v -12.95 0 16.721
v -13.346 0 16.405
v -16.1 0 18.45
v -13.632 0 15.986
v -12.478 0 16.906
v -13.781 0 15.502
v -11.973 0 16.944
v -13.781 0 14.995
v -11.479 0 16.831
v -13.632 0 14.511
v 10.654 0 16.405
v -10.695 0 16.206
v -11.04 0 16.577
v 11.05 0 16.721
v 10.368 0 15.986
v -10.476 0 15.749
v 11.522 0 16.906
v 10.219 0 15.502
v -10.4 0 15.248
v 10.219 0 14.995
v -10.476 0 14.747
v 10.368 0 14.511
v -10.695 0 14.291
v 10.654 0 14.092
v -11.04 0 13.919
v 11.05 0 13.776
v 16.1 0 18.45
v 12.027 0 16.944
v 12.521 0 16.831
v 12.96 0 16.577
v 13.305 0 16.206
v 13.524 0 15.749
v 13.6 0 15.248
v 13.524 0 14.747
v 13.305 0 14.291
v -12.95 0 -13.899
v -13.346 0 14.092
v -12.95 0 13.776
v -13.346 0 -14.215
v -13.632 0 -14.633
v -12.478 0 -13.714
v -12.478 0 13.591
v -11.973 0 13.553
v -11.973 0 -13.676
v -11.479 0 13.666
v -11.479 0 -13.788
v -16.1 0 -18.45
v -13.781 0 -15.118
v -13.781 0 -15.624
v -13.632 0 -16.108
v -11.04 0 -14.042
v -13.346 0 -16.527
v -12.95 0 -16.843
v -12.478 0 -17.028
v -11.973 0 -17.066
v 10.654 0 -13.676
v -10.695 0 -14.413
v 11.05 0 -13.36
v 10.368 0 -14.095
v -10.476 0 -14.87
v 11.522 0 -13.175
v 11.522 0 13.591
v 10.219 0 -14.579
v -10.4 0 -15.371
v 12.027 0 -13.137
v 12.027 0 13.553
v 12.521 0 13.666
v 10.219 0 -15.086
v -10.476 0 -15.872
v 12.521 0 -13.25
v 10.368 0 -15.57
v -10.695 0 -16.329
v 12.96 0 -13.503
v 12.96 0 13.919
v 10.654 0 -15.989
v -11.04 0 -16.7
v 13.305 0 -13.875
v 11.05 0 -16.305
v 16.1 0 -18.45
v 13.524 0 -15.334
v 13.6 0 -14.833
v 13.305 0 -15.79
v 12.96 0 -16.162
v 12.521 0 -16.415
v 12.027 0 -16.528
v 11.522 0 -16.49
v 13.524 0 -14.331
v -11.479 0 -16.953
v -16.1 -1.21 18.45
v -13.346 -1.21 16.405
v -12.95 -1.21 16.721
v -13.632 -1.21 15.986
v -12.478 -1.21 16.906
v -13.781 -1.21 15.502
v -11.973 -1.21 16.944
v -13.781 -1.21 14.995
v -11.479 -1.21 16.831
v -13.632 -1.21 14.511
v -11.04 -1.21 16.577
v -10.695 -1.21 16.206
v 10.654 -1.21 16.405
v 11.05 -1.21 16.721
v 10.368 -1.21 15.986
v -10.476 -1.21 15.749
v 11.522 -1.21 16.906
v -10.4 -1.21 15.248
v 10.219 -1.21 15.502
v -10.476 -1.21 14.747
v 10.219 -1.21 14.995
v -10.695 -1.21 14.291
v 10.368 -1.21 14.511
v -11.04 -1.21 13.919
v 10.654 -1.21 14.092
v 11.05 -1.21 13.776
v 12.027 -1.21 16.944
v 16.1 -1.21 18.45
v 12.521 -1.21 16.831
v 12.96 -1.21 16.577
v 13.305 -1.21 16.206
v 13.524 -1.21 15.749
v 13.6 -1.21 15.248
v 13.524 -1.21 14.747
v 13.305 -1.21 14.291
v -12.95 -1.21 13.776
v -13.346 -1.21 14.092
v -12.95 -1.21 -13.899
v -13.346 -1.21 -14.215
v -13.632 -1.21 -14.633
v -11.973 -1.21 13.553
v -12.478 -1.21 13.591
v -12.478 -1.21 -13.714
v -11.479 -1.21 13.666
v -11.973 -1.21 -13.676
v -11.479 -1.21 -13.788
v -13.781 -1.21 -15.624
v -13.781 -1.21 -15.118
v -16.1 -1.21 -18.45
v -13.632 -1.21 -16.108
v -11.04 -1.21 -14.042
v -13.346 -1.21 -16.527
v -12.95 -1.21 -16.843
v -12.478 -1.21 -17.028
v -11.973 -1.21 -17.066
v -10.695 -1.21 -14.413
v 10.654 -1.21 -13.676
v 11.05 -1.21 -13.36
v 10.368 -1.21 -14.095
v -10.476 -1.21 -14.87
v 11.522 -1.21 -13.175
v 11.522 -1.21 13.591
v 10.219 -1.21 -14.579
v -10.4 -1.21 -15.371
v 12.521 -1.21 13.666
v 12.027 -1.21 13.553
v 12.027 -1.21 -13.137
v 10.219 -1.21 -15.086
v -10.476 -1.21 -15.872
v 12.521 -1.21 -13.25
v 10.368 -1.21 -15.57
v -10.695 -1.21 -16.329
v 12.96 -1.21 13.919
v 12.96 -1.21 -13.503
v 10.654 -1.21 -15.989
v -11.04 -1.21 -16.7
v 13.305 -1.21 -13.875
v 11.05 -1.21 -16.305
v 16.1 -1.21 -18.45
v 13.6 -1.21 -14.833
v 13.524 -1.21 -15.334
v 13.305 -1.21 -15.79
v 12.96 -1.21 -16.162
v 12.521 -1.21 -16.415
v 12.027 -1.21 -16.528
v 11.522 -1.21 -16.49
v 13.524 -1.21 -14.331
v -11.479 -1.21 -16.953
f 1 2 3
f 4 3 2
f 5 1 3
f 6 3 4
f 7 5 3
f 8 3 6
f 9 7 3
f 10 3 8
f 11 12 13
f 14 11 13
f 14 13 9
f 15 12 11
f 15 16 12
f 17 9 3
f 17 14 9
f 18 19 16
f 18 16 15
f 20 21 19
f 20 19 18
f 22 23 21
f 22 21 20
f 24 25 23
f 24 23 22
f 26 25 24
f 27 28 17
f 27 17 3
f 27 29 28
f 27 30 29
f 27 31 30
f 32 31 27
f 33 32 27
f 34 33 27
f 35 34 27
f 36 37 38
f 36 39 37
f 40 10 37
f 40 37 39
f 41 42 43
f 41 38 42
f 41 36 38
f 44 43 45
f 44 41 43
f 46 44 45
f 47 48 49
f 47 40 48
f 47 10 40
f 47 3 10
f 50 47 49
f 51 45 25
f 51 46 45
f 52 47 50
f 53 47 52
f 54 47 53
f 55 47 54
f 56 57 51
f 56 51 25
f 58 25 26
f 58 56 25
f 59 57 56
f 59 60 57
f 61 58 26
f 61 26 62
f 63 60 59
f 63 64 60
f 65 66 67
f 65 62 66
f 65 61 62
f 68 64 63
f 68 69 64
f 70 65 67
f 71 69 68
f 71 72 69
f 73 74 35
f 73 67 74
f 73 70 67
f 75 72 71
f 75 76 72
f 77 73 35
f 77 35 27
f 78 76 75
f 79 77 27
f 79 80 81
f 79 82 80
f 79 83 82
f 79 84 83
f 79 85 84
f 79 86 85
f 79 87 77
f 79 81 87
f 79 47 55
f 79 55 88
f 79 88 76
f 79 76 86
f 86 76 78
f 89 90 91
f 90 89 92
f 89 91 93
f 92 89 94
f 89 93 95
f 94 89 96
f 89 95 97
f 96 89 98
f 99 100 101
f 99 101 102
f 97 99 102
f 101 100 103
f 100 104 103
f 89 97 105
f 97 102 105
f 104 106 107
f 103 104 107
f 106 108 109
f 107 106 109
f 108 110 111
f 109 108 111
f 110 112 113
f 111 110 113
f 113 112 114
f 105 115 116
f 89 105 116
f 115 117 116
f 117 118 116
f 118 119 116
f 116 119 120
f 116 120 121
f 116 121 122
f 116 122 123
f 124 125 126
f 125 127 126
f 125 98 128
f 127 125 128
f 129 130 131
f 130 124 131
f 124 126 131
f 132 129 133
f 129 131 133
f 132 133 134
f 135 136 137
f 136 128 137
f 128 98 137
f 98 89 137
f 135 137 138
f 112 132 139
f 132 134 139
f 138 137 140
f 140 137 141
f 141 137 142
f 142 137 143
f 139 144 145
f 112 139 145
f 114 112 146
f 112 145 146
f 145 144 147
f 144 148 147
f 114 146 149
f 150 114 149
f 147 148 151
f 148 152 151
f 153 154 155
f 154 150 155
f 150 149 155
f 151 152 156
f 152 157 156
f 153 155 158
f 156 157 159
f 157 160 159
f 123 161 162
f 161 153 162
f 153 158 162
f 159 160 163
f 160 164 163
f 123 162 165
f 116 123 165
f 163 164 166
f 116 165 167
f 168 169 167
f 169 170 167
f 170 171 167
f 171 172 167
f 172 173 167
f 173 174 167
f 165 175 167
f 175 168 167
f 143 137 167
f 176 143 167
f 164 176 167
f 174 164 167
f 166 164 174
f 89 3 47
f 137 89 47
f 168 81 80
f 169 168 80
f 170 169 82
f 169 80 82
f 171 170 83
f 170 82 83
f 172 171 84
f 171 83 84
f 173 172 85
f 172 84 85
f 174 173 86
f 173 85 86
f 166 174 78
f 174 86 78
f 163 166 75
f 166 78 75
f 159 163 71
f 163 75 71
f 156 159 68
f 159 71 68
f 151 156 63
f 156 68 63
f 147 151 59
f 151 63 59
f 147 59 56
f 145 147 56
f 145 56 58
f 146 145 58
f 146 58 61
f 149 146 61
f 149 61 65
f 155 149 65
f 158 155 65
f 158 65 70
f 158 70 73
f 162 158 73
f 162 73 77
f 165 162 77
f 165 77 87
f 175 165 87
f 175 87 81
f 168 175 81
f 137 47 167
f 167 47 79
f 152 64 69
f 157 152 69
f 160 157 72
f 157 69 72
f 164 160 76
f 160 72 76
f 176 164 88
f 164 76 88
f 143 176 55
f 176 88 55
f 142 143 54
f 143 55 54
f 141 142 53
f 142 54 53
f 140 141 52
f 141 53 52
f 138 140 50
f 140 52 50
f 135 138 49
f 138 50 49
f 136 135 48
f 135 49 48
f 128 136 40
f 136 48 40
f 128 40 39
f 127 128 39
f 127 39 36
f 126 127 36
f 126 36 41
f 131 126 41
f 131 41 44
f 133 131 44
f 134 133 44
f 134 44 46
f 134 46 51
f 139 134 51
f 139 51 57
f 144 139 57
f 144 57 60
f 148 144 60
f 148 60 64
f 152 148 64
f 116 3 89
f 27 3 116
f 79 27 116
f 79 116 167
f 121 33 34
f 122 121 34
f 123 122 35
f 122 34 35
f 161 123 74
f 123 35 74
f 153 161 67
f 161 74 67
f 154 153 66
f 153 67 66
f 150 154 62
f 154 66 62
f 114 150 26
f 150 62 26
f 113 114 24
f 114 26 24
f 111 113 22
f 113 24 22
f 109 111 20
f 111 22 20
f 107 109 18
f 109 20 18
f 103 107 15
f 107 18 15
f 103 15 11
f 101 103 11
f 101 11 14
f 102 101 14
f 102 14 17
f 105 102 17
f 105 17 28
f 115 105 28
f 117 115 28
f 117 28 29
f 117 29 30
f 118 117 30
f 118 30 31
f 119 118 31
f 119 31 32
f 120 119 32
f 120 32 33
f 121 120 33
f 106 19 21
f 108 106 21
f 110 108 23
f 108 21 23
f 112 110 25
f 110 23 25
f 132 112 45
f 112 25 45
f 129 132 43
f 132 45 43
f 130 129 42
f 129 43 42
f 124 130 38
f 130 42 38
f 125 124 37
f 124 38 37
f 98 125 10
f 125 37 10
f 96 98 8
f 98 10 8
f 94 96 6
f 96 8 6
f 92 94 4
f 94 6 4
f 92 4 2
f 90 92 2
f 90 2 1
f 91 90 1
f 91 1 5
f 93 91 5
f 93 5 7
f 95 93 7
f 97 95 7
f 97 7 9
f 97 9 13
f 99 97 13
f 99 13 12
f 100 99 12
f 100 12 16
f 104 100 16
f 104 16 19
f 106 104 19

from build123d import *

# Parameters (mm, degrees)
SKETCH1_W                = 32.2
SKETCH1_H                = 36.9
BASE_FLANGE1_DEPTH       = 1.21
M3_CLEARANCE_HOLE1_D     = 3.4
M3_CLEARANCE_HOLE1_DEPTH = 3.34
M3_CLEARANCE_HOLE1_TIP   = 1.021463052


# Sheet-metal steps are written as plain solids
with BuildPart() as part:
    # Sketch1 → Base-Flange1 (new body)
    with BuildSketch(Plane(origin=(0, 0, 0), x_dir=(1, 0, 0), z_dir=(0, 1, 0))):
        Rectangle(SKETCH1_W, SKETCH1_H)
    extrude(amount=-BASE_FLANGE1_DEPTH)

    # M3 Clearance Hole1
    with Locations(Plane(origin=(0, -1.21, 0), x_dir=(-1, 0, 0), z_dir=(0, -1, 0))):
        with Locations((-11.9, -15.248294706), (12.1, -15.248294706), (12.1, 15.370879883), (-11.9, 14.832508941)):
            Hole(M3_CLEARANCE_HOLE1_D / 2, depth=M3_CLEARANCE_HOLE1_DEPTH)
            with Locations((0, 0, -(M3_CLEARANCE_HOLE1_DEPTH + M3_CLEARANCE_HOLE1_TIP / 2))):  # 118° drill point
                Cone(0, M3_CLEARANCE_HOLE1_D / 2, M3_CLEARANCE_HOLE1_TIP, mode=Mode.SUBTRACT)


solid = part.part
